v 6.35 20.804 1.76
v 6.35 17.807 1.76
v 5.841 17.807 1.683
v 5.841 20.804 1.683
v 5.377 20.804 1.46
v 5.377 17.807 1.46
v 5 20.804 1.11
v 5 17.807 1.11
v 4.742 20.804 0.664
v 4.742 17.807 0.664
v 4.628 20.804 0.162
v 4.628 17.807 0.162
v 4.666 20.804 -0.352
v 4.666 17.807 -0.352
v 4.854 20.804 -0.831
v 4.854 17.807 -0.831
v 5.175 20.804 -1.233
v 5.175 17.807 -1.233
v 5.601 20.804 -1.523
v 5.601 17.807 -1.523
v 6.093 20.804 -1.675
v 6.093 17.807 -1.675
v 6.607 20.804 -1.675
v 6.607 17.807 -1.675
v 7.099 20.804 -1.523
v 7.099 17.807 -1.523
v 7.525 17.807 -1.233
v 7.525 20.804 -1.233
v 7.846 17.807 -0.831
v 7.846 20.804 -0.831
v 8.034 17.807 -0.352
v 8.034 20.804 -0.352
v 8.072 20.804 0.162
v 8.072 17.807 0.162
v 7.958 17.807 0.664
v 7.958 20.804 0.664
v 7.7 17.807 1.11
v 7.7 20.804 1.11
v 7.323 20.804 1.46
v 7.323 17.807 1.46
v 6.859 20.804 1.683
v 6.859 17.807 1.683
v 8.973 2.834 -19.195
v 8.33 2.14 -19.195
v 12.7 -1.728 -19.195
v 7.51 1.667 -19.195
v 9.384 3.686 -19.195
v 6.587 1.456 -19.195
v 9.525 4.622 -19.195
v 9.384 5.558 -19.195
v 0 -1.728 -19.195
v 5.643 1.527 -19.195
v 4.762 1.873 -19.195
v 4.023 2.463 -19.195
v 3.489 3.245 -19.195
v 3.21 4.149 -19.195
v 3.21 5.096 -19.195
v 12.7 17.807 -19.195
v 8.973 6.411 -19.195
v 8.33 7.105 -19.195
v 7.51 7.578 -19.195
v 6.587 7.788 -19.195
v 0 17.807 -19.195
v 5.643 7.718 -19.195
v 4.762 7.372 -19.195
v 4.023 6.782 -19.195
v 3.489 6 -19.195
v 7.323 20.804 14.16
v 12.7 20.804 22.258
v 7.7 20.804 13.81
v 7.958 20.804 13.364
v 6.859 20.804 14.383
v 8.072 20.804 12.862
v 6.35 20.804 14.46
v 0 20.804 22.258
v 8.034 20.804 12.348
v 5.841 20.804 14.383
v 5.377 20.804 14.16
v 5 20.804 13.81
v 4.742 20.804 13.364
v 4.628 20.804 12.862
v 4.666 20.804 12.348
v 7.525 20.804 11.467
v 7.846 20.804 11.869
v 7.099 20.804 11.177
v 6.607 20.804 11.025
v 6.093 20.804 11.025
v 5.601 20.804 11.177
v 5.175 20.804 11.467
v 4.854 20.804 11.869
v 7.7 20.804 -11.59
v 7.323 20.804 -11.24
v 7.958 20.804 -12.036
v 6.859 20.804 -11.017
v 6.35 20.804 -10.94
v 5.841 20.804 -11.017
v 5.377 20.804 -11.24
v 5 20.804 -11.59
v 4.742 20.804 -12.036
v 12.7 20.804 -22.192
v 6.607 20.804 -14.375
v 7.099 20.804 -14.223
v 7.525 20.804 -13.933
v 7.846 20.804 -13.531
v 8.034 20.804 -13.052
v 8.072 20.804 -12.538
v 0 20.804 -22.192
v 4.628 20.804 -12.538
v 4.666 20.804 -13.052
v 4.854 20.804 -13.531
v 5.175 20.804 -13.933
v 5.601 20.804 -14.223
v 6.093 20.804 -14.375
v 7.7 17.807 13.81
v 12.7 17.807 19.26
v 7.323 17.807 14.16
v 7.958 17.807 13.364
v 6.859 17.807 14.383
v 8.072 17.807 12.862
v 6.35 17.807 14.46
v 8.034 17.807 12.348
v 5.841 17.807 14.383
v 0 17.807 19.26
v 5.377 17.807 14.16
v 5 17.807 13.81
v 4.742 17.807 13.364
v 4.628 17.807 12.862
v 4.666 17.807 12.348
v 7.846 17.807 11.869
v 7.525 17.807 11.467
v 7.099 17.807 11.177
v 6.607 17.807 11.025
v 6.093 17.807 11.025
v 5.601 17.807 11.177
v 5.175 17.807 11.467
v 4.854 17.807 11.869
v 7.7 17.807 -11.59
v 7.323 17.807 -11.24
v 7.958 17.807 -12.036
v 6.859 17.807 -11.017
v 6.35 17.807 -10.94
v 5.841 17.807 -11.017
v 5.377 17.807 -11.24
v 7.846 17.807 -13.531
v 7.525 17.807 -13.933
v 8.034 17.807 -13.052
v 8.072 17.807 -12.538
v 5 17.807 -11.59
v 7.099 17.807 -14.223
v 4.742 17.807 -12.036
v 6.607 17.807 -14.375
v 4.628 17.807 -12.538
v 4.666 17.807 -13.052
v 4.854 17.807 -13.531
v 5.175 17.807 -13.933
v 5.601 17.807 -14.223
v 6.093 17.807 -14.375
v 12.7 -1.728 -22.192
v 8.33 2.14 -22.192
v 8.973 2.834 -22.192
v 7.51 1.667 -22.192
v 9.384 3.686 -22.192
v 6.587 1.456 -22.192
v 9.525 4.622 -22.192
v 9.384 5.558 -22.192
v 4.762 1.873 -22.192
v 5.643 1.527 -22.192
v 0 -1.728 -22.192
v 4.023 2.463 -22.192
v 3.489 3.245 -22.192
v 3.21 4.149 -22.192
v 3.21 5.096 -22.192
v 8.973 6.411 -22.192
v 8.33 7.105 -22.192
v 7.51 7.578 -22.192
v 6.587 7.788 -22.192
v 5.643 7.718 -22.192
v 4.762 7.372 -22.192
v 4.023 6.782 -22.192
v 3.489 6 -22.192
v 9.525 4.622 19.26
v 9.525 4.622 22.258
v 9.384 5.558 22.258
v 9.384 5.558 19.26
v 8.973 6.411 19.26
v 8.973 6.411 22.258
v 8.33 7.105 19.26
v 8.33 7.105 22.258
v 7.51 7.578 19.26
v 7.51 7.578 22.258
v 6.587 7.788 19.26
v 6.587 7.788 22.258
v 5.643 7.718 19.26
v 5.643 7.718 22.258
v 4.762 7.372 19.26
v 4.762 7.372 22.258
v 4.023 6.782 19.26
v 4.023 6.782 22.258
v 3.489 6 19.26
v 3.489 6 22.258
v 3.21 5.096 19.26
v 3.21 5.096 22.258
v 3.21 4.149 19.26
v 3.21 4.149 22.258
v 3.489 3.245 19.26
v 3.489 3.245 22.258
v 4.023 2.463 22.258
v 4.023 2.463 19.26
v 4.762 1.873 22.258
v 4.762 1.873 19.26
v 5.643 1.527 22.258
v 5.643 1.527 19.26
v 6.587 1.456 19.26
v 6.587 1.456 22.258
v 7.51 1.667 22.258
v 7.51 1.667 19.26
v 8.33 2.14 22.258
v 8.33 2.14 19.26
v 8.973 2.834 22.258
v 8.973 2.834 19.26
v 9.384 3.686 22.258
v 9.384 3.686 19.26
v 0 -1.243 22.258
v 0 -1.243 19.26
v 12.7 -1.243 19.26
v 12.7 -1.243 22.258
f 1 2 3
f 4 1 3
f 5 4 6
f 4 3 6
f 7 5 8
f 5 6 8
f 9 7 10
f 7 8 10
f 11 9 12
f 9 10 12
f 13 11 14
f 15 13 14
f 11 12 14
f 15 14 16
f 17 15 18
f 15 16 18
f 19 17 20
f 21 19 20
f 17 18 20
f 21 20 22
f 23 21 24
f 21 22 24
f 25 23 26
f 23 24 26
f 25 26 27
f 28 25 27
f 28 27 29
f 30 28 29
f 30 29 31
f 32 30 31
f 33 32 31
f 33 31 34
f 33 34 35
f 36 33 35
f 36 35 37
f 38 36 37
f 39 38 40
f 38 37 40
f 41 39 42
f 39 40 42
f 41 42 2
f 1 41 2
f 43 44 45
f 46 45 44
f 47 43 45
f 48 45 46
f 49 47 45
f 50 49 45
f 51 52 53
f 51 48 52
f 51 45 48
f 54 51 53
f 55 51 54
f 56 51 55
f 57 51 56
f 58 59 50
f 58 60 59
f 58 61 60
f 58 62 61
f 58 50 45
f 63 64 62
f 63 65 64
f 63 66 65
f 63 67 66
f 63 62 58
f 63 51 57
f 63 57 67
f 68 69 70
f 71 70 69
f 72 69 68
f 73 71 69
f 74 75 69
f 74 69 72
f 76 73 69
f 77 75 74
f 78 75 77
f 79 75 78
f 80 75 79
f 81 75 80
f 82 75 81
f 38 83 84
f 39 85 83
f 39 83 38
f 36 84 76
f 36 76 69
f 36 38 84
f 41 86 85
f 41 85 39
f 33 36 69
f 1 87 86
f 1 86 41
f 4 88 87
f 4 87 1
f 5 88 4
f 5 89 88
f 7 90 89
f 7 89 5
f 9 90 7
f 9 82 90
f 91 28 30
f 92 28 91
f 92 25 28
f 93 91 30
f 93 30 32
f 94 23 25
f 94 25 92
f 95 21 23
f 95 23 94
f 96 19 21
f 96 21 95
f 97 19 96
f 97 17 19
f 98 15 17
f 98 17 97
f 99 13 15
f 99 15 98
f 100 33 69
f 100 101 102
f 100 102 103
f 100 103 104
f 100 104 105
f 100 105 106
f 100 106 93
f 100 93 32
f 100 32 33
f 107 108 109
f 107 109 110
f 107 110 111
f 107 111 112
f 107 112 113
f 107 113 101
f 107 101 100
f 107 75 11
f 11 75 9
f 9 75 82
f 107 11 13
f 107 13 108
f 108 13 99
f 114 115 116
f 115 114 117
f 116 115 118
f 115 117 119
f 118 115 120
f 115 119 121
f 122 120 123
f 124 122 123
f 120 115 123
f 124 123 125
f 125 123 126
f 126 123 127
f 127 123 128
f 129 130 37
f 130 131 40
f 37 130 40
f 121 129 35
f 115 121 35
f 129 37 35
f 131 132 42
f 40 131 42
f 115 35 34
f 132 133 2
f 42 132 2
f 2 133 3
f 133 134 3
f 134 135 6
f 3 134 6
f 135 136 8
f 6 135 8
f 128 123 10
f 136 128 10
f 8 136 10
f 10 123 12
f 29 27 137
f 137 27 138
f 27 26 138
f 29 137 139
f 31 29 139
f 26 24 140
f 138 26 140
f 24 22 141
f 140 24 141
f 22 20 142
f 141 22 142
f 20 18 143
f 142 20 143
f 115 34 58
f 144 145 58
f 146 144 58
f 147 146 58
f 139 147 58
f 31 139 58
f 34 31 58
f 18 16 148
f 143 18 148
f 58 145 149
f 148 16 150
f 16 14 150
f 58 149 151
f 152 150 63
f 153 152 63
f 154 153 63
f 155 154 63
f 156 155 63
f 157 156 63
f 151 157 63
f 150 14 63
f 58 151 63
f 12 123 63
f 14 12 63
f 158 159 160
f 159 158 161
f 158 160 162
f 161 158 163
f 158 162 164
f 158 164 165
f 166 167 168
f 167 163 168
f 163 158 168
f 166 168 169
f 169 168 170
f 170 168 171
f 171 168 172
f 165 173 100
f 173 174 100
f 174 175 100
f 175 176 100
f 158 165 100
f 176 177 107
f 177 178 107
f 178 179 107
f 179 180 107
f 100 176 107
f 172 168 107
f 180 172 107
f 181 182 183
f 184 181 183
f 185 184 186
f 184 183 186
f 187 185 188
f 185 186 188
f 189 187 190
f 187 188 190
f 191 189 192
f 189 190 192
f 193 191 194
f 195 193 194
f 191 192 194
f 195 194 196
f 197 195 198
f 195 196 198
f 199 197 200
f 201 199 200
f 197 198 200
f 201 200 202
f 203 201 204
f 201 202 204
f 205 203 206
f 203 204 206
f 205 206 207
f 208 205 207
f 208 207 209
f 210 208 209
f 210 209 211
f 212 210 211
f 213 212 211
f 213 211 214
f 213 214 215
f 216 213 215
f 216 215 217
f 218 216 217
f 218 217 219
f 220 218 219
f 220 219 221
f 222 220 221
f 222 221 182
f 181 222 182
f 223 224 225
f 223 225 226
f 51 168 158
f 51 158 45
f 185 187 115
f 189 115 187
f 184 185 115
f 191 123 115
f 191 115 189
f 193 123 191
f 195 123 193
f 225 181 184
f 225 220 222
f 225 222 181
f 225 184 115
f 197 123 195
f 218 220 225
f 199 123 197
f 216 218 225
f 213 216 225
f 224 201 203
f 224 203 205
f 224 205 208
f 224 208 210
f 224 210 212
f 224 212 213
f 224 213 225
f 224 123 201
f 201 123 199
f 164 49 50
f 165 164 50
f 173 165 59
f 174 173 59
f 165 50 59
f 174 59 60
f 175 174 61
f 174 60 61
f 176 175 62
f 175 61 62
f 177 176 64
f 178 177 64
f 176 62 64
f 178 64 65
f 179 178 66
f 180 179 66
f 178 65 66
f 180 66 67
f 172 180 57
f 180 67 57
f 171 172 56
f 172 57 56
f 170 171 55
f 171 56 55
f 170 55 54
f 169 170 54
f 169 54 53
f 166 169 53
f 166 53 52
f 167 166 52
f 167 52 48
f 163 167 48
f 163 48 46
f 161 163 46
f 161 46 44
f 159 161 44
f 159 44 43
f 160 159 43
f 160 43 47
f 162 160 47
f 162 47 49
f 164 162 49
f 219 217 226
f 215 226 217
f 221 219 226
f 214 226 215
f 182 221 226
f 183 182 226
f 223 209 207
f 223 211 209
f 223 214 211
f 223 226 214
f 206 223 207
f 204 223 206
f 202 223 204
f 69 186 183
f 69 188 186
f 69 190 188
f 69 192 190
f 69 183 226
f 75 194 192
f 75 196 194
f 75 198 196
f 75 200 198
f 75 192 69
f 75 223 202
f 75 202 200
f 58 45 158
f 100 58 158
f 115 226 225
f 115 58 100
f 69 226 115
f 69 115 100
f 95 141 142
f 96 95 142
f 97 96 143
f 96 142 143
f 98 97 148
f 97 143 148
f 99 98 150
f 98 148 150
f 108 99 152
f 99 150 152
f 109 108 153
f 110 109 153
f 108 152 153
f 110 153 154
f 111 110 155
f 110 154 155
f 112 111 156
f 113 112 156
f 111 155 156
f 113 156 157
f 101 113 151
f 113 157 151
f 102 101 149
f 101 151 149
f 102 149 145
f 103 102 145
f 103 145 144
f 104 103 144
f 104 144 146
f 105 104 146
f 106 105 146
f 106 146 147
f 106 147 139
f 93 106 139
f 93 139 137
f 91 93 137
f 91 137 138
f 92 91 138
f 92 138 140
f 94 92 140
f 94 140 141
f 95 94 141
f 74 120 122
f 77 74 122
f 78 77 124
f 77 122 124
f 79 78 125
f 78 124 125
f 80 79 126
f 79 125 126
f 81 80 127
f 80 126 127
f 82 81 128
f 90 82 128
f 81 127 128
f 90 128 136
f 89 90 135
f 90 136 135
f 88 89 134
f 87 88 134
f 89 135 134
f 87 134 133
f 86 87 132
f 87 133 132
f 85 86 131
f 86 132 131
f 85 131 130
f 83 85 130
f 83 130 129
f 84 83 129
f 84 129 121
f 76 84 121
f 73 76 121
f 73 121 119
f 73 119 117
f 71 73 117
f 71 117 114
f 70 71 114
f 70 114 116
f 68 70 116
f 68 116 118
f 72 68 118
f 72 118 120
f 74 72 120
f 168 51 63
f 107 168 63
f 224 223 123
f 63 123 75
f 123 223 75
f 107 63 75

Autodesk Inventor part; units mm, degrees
ref_plane "YZ Plane" through (0, 0, 0) normal (1, 0, 0) x (0, 1, 0)
ref_plane "XZ Plane" through (0, 0, 0) normal (0, 1, 0) x (-1, 0, 0)
sketch "Sketch1" plane through (0, 0, 0) normal (1, 0, 0) x (0, 1, 0)
  line L0 (-1.2434, 22.2577) -> (20.8038, 22.2577)
  line L1 (20.8038, 22.2577) -> (20.8038, -15.9039)
  line L2 (17.8066, 19.2605) -> (-1.2434, 19.2605)
  line L3 (-1.2434, 19.2605) -> (-1.2434, 22.2577)
  line L4 (20.8038, 22.2577) -> (1.0601, 22.2577)
  line L5 (17.8066, 19.2605) -> (17.8066, -19.1951)
  line L6 (1.0601, -22.1923) -> (20.8038, -22.1923)
  line L7 (20.8038, -22.1923) -> (20.8038, 22.2577)
  line L8 (20.8038, -22.1923) -> (-1.7276, -22.1923)
  line L9 (-1.7276, -22.1923) -> (-1.7276, -19.1951)
  line L10 (-1.7276, -19.1951) -> (17.8066, -19.1951)
  line L11 (20.8038, -19.8757) -> (20.8038, -22.1923)
  point P0 (0, 0)
  dimension "d0" = 2.9972
  dimension "d1" = 19.05
  dimension "d2" = 44.45
  dimension "d3" = 2.9972
extrude "Extrusion1" add sketch "Sketch1" along normal blind 12.7
sketch "Sketch2" plane through (0, -1.2434, 22.2577) normal (0, 0, 1) x (1, 0, 0)
  circle A0 centre (6.35, 5.8657) radius 3.175
  line L0 (0, -0.4843) -> (12.7, -0.4843) projected
  line L1 (12.7, 22.0472) -> (12.7, 0) projected
  point P0 (0, 1.2434)
  dimension "d6" = 6.35
  dimension "d7" = 6.35
  dimension "d8" = 6.35
extrude "Extrusion2" cut sketch "Sketch2" against normal through all
sketch "Sketch3" plane through (0, 20.8038, 22.2577) normal (0, 1, 0) x (1, 0, 0)
  line L0 (9.525, 0) -> (3.175, 0) projected
  line L1 (6.35, 0) -> (6.35, 44.45) construction
  line L2 (0, 44.45) -> (12.7, 44.45) projected
  circle A0 centre (6.35, 9.525) radius 1.7272
  circle A1 centre (6.35, 22.225) radius 1.7272
  circle A2 centre (6.35, 34.925) radius 1.7272
  point P0 (0, 22.2577)
  dimension "d11" = 3.4544
  dimension "d12" = 12.7
  dimension "d13" = 12.7
hole "Hole1" at (6.35, 20.8038, -12.6673) at (6.35, 20.8038, 0.0327) at (6.35, 20.8038, 12.7327) direction (0, -1, 0) diameter 3.4544 end through all
properties part number "Papa John Bolt Plate" material "Polycarbonate, Clear"
